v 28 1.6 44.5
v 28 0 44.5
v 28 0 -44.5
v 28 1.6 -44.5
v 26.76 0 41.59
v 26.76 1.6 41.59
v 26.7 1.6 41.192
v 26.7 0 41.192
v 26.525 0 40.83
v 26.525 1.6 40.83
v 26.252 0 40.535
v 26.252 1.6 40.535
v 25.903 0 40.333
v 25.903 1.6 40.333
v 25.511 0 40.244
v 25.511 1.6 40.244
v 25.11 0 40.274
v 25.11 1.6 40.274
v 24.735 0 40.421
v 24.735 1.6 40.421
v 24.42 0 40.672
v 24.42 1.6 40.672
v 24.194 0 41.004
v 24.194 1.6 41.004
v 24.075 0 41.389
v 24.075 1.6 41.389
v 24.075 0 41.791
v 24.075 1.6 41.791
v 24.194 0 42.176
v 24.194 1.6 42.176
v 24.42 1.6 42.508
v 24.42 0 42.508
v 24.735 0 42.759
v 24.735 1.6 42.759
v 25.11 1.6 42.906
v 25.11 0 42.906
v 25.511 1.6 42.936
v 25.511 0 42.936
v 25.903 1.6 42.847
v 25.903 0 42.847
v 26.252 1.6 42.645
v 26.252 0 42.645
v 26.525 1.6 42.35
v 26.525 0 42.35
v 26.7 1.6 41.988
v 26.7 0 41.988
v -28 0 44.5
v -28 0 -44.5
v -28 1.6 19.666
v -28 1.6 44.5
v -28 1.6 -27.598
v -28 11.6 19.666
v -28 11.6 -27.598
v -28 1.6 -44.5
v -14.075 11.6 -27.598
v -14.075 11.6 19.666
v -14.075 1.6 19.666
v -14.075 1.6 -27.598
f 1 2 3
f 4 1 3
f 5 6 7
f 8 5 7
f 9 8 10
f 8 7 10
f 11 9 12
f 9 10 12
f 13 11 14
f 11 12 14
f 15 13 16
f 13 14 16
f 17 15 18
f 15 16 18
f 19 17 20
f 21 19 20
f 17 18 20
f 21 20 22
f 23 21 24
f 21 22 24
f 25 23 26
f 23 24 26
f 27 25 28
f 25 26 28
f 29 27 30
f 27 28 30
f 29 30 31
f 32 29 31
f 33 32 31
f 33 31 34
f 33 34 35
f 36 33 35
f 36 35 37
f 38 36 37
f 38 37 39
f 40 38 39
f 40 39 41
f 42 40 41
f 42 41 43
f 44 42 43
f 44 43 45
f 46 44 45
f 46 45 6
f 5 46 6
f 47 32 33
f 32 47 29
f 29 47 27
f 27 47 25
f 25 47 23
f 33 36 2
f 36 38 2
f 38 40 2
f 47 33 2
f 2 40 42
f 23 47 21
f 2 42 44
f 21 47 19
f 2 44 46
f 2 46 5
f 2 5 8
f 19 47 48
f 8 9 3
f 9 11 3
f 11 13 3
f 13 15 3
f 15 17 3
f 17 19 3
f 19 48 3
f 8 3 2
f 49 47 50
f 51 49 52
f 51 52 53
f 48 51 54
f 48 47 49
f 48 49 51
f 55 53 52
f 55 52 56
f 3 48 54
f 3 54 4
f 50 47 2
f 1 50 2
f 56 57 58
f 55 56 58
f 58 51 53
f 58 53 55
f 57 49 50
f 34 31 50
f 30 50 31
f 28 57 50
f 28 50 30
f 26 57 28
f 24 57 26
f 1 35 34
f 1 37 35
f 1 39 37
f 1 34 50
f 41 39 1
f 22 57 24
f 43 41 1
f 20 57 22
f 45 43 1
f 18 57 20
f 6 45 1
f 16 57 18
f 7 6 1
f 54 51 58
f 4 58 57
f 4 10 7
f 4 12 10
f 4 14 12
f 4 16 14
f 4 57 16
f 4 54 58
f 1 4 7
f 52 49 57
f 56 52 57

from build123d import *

# Parameters (mm, degrees)
SKETCH_1_W          = 56
SKETCH_1_H          = 89
EXTRUDE_1_DEPTH     = 1.6
SKETCH_2_W          = 13.9249856
SKETCH_2_H          = 47.2640512
EXTRUDE_2_DEPTH     = 10
SKETCH_3_R          = 1.35
CUT_EXTRUDE_1_DEPTH = 10


with BuildPart() as part:
    # 草图1 → 凸台-拉伸1 (new body)
    with BuildSketch(Plane(origin=(0, 0, 0), x_dir=(1, 0, 0), z_dir=(0, 1, 0))):
        Rectangle(SKETCH_1_W, SKETCH_1_H)
    extrude(amount=EXTRUDE_1_DEPTH)

    # 草图2 → 凸台-拉伸2 (add)
    with BuildSketch(Plane(origin=(0, 1.6, 0), x_dir=(1, 0, 0), z_dir=(0, 1, 0))):
        with Locations((-21.0375072, 3.96574336)):
            Rectangle(SKETCH_2_W, SKETCH_2_H)
    extrude(amount=EXTRUDE_2_DEPTH)

    # 草图3 → 切除-拉伸1 (cut)
    with BuildSketch(Plane(origin=(0, 1.6, 0), x_dir=(1, 0, 0), z_dir=(0, 1, 0))):
        with Locations((25.41, -41.59)):
            Circle(SKETCH_3_R)
    extrude(amount=-CUT_EXTRUDE_1_DEPTH, mode=Mode.SUBTRACT)


solid = part.part
